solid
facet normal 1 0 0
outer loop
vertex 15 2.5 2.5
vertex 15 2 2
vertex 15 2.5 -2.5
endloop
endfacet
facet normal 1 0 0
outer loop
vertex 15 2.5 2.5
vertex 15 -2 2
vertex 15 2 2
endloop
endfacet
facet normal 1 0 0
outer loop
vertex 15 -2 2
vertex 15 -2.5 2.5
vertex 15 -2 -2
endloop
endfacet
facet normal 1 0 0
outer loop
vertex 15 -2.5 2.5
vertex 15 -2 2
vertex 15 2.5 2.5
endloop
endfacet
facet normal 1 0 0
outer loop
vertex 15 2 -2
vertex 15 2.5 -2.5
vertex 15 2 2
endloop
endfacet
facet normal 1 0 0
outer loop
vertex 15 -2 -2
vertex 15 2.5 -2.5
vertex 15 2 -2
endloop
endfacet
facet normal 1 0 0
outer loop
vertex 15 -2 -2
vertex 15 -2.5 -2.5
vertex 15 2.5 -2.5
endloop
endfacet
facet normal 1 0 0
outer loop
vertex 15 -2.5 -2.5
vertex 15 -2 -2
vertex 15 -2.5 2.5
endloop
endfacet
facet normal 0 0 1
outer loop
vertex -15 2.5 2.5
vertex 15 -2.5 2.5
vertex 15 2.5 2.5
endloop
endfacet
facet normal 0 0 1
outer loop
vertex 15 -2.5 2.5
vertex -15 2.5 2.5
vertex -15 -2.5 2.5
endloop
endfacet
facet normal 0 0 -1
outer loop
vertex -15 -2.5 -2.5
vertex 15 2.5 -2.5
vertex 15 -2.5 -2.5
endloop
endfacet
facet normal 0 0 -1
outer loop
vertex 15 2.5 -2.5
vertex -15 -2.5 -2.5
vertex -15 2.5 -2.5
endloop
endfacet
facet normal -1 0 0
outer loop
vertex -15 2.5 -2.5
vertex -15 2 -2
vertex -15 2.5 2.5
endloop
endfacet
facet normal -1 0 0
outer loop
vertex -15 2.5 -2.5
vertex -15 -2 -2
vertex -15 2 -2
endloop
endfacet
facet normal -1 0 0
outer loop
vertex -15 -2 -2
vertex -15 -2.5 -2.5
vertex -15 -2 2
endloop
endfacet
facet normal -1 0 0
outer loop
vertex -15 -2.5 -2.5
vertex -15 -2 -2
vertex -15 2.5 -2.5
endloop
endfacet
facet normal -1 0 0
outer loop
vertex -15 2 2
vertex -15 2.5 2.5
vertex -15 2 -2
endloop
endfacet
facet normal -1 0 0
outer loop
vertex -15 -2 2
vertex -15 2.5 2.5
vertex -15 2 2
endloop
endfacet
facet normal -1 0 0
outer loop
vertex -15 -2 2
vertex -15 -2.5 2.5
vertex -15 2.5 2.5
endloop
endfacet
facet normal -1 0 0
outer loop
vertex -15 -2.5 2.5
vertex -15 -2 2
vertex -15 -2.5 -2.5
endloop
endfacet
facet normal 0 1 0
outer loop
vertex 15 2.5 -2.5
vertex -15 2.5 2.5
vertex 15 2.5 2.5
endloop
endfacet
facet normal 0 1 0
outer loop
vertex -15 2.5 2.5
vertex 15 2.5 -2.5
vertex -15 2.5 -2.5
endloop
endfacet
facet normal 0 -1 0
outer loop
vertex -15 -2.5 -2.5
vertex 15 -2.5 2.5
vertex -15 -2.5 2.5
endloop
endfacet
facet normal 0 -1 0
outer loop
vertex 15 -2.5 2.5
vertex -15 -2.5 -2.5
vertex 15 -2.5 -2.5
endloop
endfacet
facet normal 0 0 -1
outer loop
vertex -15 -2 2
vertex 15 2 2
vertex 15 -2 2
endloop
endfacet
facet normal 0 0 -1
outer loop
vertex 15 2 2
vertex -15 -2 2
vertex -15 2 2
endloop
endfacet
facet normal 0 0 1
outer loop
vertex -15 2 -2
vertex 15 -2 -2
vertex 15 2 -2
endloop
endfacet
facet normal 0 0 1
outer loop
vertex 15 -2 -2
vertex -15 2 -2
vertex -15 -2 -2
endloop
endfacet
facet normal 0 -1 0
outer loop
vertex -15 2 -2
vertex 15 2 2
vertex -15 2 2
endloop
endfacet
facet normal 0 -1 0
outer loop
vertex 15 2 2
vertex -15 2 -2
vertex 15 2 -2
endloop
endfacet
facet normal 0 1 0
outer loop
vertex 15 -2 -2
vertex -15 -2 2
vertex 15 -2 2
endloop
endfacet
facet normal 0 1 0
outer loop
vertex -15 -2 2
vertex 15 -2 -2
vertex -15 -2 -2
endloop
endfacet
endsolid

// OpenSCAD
//////////////////////////////////////////////////////////////////////////////////////////////
// This module is used for connecting the snorkel to the filter.//
//////////////////////////////////////////////////////////////////////////////////////////////

// Generates two BLUEoutside blocks for the plug to connect through.
module connector_block_cutout(ccube_x, ccube_y, ccube_z){
    color("blue")
    difference() {
        cube([ccube_x, ccube_y, ccube_z],center=true);
        cube([ccube_x+2, ccube_y-1, ccube_z-1],center=true);
    }
}

// Generates RED inside block for the plug to connect through.
module connector_block_outsides(ccube_x, ccube_y, ccube_z){
    color("red")
    difference() {
        connector_block_cutout(ccube_x, ccube_y, ccube_z);
        cube([ccube_x-15, ccube_y+2, ccube_z+2],center=true);
    }
}

// Generates the white plug to hold the parts together.
module connector_block_peg(ccube_x, ccube_y, ccube_z){
    color("white")
    difference() {
        cube([ccube_x+2, ccube_y, ccube_z],center=true);
        translate([-1, 0, 0])
        connector_block_cutout(ccube_x+.25, ccube_y+.25, ccube_z+.25);
    }
}

// Generates two BLUEoutside blocks for the plug to connect through.
connector_block_outsides(ccube_x=30, ccube_y=5, ccube_z=5);

// Generates RED inside block for the plug to connect through.
connector_block_cutout(ccube_x=15, ccube_y=5, ccube_z=5);

// Generates the white plug to hold the parts together.
//connector_block_peg(ccube_x=30, ccube_y=5, ccube_z=5);
